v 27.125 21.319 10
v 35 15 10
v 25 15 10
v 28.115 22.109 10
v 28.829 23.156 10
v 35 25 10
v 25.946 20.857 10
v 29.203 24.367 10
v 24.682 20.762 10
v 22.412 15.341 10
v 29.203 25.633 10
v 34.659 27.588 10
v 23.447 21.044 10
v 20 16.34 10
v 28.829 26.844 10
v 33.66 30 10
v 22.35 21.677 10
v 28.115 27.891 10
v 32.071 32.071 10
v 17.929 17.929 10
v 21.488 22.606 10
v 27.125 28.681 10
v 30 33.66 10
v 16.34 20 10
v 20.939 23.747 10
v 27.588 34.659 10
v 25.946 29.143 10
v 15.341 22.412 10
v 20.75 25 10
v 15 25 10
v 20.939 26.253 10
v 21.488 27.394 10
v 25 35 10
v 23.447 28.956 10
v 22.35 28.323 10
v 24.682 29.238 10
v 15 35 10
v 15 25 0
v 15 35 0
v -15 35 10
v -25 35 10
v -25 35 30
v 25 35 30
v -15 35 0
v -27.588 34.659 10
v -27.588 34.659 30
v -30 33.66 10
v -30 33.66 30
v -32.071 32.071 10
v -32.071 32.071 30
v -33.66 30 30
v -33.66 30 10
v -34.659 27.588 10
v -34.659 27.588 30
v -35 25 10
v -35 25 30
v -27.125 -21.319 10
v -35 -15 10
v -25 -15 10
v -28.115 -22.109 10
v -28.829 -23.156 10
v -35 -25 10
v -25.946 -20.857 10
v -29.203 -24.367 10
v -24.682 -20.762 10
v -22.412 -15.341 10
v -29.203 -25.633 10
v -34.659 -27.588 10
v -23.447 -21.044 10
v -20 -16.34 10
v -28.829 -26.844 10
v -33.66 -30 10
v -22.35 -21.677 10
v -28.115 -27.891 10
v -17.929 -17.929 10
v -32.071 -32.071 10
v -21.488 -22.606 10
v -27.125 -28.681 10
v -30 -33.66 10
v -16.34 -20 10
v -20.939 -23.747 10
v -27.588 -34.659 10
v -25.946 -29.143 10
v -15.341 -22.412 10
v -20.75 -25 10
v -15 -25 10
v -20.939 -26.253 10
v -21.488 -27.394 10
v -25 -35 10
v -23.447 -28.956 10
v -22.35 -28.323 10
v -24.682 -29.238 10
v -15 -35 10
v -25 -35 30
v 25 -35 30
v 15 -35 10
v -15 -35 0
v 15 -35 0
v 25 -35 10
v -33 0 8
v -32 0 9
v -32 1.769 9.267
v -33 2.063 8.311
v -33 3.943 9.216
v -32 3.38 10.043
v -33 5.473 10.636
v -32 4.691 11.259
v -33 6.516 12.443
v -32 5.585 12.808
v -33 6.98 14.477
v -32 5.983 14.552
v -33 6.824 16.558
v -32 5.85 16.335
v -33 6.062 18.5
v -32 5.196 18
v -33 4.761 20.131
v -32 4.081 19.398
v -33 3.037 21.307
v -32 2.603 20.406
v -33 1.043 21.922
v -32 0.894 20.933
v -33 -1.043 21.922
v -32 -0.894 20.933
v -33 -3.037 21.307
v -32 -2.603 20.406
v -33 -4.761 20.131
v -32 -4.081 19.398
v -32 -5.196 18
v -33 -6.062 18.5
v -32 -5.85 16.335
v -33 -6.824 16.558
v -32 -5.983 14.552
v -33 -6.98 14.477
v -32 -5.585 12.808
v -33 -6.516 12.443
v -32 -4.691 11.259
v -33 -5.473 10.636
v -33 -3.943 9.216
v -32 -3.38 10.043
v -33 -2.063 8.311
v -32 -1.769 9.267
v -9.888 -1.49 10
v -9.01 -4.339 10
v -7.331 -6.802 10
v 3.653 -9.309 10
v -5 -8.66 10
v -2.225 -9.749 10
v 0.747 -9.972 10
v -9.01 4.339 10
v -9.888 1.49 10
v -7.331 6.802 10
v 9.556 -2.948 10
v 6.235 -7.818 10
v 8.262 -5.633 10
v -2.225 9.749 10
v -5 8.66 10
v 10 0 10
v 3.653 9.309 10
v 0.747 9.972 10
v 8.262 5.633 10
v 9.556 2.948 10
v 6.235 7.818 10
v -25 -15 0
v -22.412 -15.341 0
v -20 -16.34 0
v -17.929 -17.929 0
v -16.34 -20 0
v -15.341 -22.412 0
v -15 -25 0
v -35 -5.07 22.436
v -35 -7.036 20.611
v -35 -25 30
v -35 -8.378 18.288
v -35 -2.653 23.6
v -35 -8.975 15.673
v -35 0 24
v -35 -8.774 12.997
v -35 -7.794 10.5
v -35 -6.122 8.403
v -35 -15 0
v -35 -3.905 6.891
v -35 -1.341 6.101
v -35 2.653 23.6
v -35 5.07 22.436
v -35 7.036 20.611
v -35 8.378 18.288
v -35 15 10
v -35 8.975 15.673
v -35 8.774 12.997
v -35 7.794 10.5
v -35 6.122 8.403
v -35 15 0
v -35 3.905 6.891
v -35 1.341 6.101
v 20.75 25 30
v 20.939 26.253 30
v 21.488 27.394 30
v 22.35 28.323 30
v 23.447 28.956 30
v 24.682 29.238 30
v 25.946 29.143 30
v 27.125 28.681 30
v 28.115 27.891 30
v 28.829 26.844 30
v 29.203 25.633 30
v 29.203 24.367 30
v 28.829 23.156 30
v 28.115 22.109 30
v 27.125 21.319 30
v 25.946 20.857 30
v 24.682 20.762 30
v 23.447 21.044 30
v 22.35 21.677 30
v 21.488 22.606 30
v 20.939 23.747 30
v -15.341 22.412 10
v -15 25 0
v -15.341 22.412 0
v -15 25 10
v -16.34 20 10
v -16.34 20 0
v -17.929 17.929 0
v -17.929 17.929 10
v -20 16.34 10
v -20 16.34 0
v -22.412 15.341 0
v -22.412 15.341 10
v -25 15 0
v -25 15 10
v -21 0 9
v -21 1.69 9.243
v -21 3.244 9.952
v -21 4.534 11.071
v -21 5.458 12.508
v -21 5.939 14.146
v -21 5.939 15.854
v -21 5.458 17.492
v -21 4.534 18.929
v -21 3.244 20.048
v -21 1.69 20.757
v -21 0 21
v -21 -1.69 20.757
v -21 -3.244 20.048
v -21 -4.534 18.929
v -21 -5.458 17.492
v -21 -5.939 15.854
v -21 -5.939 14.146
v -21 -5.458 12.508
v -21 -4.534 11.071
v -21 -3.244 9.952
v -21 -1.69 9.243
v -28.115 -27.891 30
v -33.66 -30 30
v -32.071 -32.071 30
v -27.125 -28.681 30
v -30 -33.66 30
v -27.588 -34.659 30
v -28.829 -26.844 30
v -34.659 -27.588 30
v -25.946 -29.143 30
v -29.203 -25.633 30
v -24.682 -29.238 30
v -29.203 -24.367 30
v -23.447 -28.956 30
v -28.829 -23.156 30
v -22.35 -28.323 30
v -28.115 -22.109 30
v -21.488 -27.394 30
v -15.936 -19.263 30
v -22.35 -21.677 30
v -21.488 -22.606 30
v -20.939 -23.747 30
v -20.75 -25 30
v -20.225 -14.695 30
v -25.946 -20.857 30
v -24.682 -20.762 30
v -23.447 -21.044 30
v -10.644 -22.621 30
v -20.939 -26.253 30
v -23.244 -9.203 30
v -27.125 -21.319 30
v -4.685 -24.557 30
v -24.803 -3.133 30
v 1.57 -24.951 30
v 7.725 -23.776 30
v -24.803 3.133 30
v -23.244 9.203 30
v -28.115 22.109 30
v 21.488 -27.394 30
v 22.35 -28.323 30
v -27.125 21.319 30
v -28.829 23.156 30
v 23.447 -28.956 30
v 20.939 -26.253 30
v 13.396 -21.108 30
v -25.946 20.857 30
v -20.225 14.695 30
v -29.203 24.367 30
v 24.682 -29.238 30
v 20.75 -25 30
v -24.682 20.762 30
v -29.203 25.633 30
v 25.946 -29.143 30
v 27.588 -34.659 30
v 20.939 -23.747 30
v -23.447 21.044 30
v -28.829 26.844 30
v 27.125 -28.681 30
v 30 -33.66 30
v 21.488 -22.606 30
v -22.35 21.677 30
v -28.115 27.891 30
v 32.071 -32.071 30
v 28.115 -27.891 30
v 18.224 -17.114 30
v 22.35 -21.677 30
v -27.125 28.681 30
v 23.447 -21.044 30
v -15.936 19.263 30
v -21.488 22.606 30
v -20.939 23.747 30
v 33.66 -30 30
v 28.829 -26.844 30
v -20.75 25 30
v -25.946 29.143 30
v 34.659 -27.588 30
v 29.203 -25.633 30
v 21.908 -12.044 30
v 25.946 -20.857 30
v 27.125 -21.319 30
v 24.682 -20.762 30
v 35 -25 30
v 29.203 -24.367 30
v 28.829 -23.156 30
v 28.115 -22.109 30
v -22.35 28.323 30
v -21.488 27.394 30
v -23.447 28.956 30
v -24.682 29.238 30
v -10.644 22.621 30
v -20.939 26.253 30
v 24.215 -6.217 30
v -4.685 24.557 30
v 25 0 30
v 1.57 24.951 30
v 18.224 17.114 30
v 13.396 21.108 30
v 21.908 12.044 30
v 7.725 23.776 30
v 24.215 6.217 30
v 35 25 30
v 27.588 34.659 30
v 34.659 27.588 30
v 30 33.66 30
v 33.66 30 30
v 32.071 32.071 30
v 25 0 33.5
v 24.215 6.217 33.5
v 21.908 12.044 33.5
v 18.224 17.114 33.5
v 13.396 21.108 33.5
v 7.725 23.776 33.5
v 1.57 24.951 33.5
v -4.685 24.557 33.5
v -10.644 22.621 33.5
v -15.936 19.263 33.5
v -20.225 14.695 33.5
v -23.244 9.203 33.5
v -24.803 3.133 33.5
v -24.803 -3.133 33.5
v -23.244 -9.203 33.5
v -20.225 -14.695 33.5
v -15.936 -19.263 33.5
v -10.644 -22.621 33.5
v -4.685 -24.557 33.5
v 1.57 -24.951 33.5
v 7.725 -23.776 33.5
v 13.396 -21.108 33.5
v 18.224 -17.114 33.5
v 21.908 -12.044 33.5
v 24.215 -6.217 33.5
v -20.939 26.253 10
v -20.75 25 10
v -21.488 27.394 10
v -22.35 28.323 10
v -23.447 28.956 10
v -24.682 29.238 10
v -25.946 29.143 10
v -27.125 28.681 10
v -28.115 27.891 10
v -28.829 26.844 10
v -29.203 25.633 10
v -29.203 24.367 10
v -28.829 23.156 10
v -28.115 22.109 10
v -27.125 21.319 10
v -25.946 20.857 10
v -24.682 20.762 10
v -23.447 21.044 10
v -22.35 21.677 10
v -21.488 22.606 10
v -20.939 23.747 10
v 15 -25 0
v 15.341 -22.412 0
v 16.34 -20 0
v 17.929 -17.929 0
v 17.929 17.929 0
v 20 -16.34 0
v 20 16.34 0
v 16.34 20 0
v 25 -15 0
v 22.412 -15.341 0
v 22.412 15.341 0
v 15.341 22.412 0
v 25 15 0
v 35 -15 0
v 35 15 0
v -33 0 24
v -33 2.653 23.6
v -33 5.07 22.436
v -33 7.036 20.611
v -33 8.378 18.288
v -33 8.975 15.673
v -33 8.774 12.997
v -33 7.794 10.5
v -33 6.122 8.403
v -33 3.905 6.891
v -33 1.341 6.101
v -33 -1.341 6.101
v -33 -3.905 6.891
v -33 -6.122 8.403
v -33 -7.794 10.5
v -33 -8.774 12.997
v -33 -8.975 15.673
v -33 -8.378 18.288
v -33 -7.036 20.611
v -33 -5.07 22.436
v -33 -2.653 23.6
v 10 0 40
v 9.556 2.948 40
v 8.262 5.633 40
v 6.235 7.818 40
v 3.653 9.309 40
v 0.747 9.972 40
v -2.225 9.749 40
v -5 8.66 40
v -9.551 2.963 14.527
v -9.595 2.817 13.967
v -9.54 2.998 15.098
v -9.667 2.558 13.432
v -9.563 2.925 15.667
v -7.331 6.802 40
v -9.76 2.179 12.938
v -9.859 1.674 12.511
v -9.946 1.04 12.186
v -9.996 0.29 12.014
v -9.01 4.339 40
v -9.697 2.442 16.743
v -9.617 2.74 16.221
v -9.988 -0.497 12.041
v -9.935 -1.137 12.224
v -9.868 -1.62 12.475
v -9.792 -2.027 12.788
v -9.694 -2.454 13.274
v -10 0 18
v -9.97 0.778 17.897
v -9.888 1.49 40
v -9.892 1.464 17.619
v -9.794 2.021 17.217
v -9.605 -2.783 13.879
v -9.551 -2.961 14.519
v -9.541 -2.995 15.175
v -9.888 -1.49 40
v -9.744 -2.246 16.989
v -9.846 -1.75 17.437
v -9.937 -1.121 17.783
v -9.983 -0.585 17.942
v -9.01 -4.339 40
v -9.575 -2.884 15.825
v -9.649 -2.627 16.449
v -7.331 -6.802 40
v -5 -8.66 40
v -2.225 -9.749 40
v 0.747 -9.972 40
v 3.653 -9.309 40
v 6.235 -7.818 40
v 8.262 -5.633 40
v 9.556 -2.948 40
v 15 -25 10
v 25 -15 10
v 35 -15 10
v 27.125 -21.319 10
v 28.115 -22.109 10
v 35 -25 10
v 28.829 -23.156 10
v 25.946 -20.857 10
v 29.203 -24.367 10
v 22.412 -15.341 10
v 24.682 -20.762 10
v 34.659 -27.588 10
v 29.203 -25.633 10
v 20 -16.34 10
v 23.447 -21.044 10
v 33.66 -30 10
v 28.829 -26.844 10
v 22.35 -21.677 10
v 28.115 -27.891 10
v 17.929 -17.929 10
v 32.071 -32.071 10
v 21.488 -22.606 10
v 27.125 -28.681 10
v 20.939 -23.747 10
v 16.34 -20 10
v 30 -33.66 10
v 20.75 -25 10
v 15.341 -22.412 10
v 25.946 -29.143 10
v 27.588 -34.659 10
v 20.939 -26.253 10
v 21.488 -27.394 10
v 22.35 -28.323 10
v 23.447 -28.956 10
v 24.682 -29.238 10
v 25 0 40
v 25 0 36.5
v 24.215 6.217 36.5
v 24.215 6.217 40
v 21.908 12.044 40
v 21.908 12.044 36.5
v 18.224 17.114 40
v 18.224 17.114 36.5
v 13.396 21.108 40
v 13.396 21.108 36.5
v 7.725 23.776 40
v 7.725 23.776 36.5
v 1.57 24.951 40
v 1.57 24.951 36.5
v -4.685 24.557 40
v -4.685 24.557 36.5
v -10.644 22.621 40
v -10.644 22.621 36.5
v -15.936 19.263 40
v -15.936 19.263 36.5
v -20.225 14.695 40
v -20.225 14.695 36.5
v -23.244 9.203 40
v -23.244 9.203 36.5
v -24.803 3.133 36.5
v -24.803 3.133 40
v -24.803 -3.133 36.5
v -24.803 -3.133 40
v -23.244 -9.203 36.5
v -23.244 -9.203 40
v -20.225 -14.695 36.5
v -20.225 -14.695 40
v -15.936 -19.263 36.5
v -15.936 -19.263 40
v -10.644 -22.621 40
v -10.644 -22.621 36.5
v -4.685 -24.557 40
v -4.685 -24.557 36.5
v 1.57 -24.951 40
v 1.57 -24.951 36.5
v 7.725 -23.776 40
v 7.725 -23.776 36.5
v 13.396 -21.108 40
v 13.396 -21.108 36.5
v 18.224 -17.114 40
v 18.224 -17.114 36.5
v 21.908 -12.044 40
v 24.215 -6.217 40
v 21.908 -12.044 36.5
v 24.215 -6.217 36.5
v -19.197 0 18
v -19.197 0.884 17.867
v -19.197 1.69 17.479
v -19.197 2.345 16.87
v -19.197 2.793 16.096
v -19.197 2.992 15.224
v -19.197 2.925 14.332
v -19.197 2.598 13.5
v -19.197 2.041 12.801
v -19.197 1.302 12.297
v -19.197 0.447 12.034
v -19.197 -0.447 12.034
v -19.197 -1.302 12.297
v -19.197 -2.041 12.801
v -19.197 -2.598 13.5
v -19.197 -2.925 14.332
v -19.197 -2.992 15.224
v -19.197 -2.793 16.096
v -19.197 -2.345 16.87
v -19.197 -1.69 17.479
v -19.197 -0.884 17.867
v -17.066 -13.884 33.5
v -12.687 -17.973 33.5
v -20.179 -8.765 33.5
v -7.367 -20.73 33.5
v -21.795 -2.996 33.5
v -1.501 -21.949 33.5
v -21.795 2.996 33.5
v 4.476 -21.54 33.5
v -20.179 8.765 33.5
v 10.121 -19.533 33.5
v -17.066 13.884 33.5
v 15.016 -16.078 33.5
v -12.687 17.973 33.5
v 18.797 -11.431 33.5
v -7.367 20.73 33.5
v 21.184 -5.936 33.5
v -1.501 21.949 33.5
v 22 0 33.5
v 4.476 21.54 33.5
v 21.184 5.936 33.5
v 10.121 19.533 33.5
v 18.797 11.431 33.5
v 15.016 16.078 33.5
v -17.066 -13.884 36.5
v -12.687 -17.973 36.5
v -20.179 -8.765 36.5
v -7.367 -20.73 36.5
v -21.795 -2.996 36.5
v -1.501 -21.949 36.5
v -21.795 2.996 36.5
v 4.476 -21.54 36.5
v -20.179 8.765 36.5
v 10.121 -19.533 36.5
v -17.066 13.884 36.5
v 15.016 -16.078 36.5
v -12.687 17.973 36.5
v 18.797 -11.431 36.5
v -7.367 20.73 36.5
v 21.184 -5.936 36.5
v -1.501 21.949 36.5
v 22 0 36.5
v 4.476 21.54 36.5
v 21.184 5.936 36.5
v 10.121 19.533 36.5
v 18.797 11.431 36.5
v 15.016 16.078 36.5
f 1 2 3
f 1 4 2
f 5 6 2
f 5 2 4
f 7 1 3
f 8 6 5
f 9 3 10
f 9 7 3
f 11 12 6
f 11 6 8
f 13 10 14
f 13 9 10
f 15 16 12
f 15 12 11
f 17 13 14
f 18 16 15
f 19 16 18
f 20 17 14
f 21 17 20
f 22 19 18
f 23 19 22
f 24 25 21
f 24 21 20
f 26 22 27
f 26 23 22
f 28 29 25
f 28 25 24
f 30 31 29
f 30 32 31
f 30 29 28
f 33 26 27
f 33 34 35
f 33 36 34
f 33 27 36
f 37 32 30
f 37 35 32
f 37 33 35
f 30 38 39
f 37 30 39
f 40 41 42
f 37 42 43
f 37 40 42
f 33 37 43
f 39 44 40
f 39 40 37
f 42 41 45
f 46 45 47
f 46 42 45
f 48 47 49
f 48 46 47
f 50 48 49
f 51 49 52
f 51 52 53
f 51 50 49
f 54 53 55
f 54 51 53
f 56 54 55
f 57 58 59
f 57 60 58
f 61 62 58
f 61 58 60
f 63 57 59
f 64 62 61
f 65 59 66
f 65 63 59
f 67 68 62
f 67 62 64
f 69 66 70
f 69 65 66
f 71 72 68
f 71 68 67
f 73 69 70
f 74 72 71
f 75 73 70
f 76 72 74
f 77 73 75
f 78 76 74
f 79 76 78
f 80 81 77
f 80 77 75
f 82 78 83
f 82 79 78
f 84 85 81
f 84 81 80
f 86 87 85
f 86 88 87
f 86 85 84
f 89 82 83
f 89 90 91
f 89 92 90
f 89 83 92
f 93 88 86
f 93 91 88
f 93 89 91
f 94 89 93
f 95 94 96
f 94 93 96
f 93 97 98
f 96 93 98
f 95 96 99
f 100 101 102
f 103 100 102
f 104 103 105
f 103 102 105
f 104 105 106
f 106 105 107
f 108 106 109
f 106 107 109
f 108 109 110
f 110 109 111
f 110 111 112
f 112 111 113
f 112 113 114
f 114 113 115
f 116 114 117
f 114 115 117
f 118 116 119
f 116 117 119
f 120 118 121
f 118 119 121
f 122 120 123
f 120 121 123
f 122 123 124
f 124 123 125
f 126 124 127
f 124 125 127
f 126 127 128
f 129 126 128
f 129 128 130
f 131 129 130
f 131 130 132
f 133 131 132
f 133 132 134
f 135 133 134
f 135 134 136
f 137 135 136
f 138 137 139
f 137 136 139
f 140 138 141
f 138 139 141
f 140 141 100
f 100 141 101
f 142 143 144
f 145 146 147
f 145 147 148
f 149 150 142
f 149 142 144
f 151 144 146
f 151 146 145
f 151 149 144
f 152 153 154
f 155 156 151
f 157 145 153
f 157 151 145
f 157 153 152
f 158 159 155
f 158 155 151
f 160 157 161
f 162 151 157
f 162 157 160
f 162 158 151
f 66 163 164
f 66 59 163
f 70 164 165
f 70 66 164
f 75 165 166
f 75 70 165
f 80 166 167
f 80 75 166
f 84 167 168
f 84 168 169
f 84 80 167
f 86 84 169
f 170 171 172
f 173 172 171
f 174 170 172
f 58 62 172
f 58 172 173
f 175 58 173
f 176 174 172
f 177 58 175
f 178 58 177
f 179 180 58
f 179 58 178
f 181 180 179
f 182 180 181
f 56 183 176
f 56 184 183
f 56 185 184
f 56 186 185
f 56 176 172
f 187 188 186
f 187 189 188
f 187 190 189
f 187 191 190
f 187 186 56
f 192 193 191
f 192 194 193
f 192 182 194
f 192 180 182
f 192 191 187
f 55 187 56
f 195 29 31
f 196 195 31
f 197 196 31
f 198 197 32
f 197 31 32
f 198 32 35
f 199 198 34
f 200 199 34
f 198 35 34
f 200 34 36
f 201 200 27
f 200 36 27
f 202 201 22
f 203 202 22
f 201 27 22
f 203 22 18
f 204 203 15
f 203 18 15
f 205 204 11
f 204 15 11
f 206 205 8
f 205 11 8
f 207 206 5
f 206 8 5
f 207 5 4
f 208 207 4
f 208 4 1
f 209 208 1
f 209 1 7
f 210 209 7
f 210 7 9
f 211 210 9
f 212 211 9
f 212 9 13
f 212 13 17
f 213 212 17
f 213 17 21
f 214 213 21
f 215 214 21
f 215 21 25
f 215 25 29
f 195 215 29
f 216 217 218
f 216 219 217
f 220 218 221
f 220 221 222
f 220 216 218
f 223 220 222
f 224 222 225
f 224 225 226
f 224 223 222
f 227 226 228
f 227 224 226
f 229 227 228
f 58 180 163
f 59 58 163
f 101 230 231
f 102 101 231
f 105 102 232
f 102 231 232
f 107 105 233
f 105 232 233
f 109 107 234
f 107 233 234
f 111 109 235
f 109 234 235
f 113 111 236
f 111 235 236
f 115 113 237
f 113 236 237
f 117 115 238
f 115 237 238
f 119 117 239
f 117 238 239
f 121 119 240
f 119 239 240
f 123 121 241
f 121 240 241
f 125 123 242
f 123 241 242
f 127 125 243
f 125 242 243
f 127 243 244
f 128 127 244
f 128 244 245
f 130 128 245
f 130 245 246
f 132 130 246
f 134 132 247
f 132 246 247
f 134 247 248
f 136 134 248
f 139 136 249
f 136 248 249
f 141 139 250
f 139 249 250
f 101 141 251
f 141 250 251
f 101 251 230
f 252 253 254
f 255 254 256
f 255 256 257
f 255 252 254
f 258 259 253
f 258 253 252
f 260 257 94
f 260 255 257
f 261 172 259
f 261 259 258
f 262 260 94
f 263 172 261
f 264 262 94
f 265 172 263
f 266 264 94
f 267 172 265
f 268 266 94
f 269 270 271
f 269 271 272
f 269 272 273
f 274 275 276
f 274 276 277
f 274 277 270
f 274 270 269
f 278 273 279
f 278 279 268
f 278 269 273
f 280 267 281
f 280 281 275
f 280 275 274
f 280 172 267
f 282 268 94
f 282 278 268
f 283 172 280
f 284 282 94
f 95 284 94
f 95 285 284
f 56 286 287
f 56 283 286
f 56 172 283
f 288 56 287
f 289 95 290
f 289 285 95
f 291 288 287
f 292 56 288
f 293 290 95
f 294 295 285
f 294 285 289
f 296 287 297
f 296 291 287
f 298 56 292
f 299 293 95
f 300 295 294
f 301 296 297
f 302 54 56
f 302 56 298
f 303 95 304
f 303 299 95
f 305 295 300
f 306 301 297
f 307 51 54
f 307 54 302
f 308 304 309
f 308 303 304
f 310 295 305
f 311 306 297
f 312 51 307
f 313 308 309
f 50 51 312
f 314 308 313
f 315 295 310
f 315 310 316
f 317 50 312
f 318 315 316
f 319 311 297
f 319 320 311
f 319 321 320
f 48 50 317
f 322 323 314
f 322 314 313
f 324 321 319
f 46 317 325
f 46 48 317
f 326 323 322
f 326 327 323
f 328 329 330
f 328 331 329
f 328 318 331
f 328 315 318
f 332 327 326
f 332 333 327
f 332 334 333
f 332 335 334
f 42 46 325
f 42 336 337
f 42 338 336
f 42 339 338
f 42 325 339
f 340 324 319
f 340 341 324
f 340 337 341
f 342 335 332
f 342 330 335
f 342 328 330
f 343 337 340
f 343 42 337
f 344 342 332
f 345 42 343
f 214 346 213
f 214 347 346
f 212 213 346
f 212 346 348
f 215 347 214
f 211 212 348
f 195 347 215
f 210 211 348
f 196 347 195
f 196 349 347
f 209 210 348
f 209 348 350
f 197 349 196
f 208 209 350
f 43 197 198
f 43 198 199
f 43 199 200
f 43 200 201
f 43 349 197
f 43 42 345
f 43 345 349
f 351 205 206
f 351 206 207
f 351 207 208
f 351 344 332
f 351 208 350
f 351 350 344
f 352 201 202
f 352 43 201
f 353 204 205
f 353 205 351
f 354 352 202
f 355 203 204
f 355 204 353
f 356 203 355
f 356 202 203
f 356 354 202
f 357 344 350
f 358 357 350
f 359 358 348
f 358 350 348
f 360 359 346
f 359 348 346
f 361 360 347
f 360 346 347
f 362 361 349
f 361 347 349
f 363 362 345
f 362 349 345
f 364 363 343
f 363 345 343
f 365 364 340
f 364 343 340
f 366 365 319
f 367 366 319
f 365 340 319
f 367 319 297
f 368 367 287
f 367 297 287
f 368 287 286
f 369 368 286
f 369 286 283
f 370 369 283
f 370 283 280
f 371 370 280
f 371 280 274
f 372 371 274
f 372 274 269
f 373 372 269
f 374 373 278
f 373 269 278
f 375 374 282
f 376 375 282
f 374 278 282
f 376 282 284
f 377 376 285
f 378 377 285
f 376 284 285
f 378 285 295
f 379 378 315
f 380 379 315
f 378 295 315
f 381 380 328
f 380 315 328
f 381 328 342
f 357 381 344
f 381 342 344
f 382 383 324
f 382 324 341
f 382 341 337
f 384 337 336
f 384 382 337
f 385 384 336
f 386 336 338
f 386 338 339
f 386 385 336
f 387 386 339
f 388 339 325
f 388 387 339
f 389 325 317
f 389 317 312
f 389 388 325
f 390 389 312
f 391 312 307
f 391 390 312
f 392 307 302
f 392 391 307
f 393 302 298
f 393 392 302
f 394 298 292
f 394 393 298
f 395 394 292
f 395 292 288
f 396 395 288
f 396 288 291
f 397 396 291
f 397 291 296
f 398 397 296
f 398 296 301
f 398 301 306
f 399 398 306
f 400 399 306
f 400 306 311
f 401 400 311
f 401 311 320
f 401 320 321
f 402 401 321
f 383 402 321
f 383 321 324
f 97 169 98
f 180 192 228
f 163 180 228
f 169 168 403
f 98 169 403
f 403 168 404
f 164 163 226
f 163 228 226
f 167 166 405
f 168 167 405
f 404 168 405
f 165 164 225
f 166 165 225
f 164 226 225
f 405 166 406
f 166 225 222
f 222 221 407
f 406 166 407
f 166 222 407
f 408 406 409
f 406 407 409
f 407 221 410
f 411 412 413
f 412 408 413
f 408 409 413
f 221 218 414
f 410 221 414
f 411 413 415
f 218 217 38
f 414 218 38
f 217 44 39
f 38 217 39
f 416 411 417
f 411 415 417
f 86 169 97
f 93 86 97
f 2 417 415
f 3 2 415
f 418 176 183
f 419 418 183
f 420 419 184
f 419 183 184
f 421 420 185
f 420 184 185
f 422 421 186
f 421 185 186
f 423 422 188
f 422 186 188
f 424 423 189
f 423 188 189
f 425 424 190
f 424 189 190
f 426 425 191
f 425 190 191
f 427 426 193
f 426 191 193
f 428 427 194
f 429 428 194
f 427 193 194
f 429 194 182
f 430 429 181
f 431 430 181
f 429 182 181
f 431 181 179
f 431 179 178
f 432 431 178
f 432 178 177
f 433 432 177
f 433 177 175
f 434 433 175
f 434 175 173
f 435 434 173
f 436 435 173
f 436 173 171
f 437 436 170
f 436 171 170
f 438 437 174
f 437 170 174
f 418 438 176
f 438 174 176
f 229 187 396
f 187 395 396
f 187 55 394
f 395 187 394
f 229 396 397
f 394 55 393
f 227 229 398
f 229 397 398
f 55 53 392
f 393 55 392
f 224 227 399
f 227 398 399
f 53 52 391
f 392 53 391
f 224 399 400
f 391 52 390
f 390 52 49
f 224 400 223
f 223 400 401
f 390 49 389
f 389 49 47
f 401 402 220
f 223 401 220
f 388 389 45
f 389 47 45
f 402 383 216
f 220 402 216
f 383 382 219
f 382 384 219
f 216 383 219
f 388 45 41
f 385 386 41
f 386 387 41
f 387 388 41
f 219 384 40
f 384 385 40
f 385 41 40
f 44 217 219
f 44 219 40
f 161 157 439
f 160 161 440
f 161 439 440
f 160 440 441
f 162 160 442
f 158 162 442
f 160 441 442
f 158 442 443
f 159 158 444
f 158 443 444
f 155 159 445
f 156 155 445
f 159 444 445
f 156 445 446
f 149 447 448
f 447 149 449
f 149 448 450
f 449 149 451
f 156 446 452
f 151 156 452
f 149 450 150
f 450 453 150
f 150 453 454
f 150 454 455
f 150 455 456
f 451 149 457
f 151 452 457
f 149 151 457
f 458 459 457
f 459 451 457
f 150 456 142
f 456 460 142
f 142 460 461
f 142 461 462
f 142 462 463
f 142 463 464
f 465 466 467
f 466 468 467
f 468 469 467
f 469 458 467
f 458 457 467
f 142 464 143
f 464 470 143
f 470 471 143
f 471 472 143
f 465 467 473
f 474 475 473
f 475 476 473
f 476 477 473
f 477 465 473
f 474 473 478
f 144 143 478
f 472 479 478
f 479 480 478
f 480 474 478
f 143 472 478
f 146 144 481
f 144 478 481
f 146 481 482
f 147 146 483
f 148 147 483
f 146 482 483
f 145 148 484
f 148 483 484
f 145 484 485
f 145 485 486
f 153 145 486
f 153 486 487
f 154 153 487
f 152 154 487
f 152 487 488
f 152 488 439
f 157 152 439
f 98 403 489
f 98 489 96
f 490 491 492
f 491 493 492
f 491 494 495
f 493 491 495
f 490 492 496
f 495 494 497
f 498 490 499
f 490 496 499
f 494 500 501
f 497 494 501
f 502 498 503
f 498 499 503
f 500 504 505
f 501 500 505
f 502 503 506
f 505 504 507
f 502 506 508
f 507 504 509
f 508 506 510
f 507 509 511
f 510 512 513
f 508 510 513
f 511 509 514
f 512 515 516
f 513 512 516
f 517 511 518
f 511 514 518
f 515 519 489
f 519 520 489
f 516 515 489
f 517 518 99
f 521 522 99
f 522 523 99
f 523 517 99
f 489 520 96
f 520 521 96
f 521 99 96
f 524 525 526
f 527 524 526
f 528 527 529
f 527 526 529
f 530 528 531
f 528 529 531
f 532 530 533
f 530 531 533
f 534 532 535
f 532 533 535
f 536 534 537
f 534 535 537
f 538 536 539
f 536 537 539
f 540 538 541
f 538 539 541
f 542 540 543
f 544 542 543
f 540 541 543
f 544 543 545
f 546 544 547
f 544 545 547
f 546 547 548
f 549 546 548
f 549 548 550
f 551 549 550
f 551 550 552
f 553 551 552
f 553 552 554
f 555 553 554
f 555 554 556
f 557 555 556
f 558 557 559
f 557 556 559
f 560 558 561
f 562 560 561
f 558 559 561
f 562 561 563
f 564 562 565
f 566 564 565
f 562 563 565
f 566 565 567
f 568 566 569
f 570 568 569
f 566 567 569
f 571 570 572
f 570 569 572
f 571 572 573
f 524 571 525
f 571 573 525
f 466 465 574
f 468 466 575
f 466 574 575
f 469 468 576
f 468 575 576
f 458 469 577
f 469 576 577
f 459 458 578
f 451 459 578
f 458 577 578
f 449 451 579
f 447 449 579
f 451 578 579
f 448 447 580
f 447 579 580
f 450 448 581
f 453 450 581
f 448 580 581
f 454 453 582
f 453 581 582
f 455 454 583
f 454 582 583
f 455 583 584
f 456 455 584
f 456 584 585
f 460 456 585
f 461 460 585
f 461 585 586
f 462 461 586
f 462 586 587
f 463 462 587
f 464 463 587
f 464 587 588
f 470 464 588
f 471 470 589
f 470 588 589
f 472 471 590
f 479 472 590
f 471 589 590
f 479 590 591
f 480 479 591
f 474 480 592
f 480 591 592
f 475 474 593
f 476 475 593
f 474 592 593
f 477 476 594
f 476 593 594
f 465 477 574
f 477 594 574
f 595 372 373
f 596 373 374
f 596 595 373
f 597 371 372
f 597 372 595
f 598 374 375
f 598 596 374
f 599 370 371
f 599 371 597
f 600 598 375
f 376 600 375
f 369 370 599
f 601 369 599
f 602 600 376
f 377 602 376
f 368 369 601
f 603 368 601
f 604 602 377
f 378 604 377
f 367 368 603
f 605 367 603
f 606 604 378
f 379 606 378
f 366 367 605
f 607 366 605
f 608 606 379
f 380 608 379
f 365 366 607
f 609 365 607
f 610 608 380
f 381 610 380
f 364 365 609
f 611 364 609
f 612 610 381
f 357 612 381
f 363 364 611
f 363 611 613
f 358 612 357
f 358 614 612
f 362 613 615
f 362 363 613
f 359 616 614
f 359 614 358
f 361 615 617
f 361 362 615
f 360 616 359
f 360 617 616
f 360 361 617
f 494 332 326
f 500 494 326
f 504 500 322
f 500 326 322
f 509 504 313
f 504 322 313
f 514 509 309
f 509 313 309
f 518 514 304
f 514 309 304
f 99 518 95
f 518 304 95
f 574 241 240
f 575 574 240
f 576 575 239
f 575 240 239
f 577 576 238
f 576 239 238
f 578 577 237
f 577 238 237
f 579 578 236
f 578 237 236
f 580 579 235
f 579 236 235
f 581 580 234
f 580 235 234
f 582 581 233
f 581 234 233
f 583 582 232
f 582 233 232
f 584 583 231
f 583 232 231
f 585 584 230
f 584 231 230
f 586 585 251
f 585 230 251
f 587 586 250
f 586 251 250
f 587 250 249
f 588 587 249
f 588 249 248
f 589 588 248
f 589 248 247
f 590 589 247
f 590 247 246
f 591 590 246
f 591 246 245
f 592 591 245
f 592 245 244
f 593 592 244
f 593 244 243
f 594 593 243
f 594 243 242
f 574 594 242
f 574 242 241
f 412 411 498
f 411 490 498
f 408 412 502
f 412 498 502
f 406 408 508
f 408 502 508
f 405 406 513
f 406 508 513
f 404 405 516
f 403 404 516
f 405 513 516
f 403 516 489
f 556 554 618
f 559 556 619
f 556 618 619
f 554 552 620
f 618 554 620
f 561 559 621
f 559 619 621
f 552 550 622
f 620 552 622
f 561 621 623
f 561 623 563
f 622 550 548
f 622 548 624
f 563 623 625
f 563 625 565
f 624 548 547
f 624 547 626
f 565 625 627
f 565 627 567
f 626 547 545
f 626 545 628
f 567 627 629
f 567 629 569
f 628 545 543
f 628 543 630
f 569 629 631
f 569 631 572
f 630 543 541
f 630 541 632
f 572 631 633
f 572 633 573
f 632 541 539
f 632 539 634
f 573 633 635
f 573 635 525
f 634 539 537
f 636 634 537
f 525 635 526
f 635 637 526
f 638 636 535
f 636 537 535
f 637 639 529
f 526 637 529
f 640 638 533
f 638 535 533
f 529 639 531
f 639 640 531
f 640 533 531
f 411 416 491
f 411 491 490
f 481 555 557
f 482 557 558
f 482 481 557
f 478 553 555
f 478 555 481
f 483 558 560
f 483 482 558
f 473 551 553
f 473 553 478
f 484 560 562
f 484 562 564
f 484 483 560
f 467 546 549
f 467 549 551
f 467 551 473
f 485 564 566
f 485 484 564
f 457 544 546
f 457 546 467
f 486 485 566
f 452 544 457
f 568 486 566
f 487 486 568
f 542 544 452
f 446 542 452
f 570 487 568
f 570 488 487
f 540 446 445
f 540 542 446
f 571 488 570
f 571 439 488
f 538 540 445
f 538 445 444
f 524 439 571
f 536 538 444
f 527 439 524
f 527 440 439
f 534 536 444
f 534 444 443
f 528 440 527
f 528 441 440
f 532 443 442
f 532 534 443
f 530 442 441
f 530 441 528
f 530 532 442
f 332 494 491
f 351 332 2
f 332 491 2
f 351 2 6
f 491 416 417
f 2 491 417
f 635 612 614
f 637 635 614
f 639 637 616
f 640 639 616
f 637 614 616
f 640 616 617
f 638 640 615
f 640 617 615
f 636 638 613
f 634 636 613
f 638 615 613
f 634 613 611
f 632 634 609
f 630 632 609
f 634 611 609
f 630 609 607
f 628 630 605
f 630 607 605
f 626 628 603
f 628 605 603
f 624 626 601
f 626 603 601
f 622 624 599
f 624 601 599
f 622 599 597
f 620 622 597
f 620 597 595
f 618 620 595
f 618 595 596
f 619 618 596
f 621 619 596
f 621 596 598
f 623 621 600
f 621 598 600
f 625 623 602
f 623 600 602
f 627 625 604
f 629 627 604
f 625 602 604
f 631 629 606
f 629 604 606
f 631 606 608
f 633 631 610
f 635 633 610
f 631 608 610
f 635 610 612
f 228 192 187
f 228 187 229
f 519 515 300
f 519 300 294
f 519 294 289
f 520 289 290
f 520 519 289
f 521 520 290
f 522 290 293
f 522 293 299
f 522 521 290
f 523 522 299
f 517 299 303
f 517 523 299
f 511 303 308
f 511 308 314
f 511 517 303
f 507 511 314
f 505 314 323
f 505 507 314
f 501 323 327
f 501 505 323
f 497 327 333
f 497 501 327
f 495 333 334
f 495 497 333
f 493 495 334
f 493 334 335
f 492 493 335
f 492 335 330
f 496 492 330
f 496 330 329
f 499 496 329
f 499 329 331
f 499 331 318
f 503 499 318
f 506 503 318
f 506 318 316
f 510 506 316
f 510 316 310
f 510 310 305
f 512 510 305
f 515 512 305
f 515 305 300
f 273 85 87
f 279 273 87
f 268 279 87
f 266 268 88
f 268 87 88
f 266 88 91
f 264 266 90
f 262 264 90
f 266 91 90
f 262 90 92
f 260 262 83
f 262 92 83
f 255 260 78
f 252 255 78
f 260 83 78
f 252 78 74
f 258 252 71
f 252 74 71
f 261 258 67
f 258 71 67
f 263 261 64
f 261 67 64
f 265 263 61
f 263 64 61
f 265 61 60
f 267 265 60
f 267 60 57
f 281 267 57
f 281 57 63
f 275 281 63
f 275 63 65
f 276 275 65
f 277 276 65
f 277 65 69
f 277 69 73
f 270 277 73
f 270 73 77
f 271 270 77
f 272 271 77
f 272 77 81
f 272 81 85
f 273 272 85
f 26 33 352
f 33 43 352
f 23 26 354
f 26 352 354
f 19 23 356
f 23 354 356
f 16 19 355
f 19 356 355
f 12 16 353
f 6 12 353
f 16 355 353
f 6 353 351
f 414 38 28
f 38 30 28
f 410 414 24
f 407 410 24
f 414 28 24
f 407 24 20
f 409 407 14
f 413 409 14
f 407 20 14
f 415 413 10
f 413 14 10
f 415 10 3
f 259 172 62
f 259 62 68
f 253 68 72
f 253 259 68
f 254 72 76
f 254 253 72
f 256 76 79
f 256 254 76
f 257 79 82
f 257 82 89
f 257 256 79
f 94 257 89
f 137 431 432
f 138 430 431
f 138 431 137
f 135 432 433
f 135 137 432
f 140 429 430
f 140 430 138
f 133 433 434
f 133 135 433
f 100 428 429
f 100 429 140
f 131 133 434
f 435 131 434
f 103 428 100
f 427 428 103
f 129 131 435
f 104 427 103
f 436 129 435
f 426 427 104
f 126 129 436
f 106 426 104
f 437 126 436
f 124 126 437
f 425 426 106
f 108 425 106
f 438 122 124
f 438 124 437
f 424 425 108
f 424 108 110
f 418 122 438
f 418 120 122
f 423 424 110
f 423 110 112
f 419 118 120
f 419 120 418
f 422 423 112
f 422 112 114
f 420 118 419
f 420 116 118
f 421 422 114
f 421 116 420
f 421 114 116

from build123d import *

# Parameters (mm, degrees)
SKETCH1_W               = 70
SKETCH1_H               = 70
BOSS_EXTRUDE1_DEPTH     = 30
SKETCH2_R               = 25
BOSS_EXTRUDE2_DEPTH     = 3.5
SKETCH3_R               = 22
BOSS_EXTRUDE3_DEPTH     = 3
SKETCH4_R               = 25
BOSS_EXTRUDE4_DEPTH     = 3.5
CUT_EXTRUDE1_REACH      = 65.64
SKETCH5_R               = 4.25
SKETCH5_3_W             = 20
SKETCH5_3_H             = 20
SKETCH5_3_R             = 4.25
CUT_EXTRUDE2_DEPTH      = 10
FILLET1_R               = 10
FILLET2_R               = 10
SKETCH7_R               = 10
CUT_EXTRUDE3_DEPTH      = 30
SKETCH8_R               = 9
CUT_EXTRUDE4_DEPTH      = 2
MIRROR6_COPY_1_REACH    = 65.64
MIRROR6_COPY_1_SKETCH_R = 4.25
MIRROR6_COPY_2_SKETCH_W = 20
MIRROR6_COPY_2_SKETCH_H = 20
MIRROR6_COPY_2_SKETCH_R = 4.25
MIRROR6_COPY_2_DEPTH    = 10
FILLET3_R               = 10
M14_TAPPED_HOLE1_D      = 12
M14_TAPPED_HOLE1_DEPTH  = 12
M14_TAPPED_HOLE1_TIP    = 3.605163714
CHAMFER1_SIZE           = 1
CUT_EXTRUDE5_REACH      = 88.308
CUT_EXTRUDE5_END_RADIUS = 10
SKETCH13_R              = 3


with BuildPart() as part:
    # Sketch1 → Boss-Extrude1 (new body)
    with BuildSketch(Plane.XY):
        Rectangle(SKETCH1_W, SKETCH1_H)
    extrude(amount=BOSS_EXTRUDE1_DEPTH)

    # Sketch2 → Boss-Extrude2 (add)
    with BuildSketch(Plane.XY.offset(30)):
        Circle(SKETCH2_R)
    extrude(amount=BOSS_EXTRUDE2_DEPTH)

    # Sketch3 → Boss-Extrude3 (add)
    with BuildSketch(Plane.XY.offset(33.5)):
        Circle(SKETCH3_R)
    extrude(amount=BOSS_EXTRUDE3_DEPTH)

    # Sketch4 → Boss-Extrude4 (add)
    with BuildSketch(Plane.XY.offset(36.5)):
        Circle(SKETCH4_R)
    extrude(amount=BOSS_EXTRUDE4_DEPTH)

    # Sketch5 → Cut-Extrude1 (cut, up to next)
    with BuildSketch(Plane(origin=(0, 0, 0), x_dir=(-1, 0, 0), z_dir=(0, 0, -1)), mode=Mode.PRIVATE) as cut_extrude1_sk1:
        with Locations((-25, 25)):
            Circle(SKETCH5_R)
    cut_extrude1_tool1 = extrude(cut_extrude1_sk1.sketch, amount=-CUT_EXTRUDE1_REACH, mode=Mode.PRIVATE) & part.part
    cut_extrude1 = cut_extrude1_tool1.solids().sort_by_distance((25, 25, 0))[0]
    add(cut_extrude1, mode=Mode.SUBTRACT)

    # Sketch5<3> → Cut-Extrude2 (cut)
    with BuildSketch(Plane(origin=(0, 0, 0), x_dir=(-1, 0, 0), z_dir=(0, 0, -1))):
        with Locations((-25, 25)):
            Rectangle(SKETCH5_3_W, SKETCH5_3_H)
        with Locations((-25, 25)):
            Circle(SKETCH5_3_R, mode=Mode.SUBTRACT)
    cut_extrude2 = extrude(amount=-CUT_EXTRUDE2_DEPTH, mode=Mode.SUBTRACT)

    # Fillet1
    fillet1_edges = [part.edges().sort_by_distance(p)[0] for p in [
        (15, 15, 5),
        (35, 35, 20),
    ]]
    fillet(fillet1_edges, radius=FILLET1_R)

    # Fillet2
    fillet2_edges = [part.edges().sort_by_distance(p)[0] for p in [
        (-35, 35, 15),
        (35, -35, 15),
        (-35, -35, 15),
    ]]
    fillet(fillet2_edges, radius=FILLET2_R)

    # Sketch7 → Cut-Extrude3 (cut)
    with BuildSketch(Plane.XY.offset(40)):
        Circle(SKETCH7_R)
    extrude(amount=-CUT_EXTRUDE3_DEPTH, mode=Mode.SUBTRACT)

    # Sketch8 → Cut-Extrude4 (cut)
    with BuildSketch(Plane.ZY.offset(35)):
        with Locations((15, 0)):
            Circle(SKETCH8_R)
    extrude(amount=-CUT_EXTRUDE4_DEPTH, mode=Mode.SUBTRACT)

    # Mirror5: Cut-Extrude1, Cut-Extrude2 across plane
    add(cut_extrude1.mirror(Plane.ZX), mode=Mode.SUBTRACT)
    add(cut_extrude2.mirror(Plane.ZX), mode=Mode.SUBTRACT)

    # Mirror6: Cut-Extrude1, Cut-Extrude2 across plane
    add(cut_extrude1.mirror(Plane(origin=(0, 0, 0), x_dir=(0, 0, 1), z_dir=(1, 0, 0))), mode=Mode.SUBTRACT)
    add(cut_extrude2.mirror(Plane(origin=(0, 0, 0), x_dir=(0, 0, 1), z_dir=(1, 0, 0))), mode=Mode.SUBTRACT)

    # Mirror6 copy 1 sketch → Mirror6 copy 1 (cut, up to next)
    with BuildSketch(Plane(origin=(0, 0, 0), x_dir=(1, 0, 0), z_dir=(0, 0, -1)), mode=Mode.PRIVATE) as mirror6_copy_1_sk1:
        with Locations((-25, 25)):
            Circle(MIRROR6_COPY_1_SKETCH_R)
    mirror6_copy_1_tool1 = extrude(mirror6_copy_1_sk1.sketch, amount=-MIRROR6_COPY_1_REACH, mode=Mode.PRIVATE) & part.part
    add(mirror6_copy_1_tool1.solids().sort_by_distance((-25, -25, 0))[0], mode=Mode.SUBTRACT)

    # Mirror6 copy 2 sketch → Mirror6 copy 2 (cut)
    with BuildSketch(Plane(origin=(0, 0, 0), x_dir=(1, 0, 0), z_dir=(0, 0, -1))):
        with Locations((-25, 25)):
            Rectangle(MIRROR6_COPY_2_SKETCH_W, MIRROR6_COPY_2_SKETCH_H)
        with Locations((-25, 25)):
            Circle(MIRROR6_COPY_2_SKETCH_R, mode=Mode.SUBTRACT)
    extrude(amount=-MIRROR6_COPY_2_DEPTH, mode=Mode.SUBTRACT)

    # Fillet3
    fillet3_edges = [part.edges().sort_by_distance(p)[0] for p in [
        (-15, 15, 5),
        (-15, -15, 5),
        (15, -15, 5),
    ]]
    fillet(fillet3_edges, radius=FILLET3_R)

    # M14 Tapped Hole1
    with Locations(Plane.ZY.offset(33)):
        with Locations((15, 0)):
            Hole(M14_TAPPED_HOLE1_D / 2, depth=M14_TAPPED_HOLE1_DEPTH)
            with Locations((0, 0, -(M14_TAPPED_HOLE1_DEPTH + M14_TAPPED_HOLE1_TIP / 2))):  # 118° drill point
                Cone(0, M14_TAPPED_HOLE1_D / 2, M14_TAPPED_HOLE1_TIP, mode=Mode.SUBTRACT)

    # Chamfer1
    chamfer1_edges = [part.edges().sort_by_distance(p)[0] for p in [
        (-33, 0, 21),
    ]]
    chamfer(chamfer1_edges, length=CHAMFER1_SIZE)

    # Cut-Extrude5: up to this cylinder (the profile starts outside it)
    cut_extrude5_end = Plane(origin=(0, 0, 15), z_dir=(0, 0, 1)) * Cylinder(CUT_EXTRUDE5_END_RADIUS, 197.616, mode=Mode.PRIVATE)
    # Sketch13 → Cut-Extrude5 (cut, up to the surface)
    with BuildSketch(Plane.ZY.offset(33), mode=Mode.PRIVATE) as cut_extrude5_sk1:
        with Locations((15, 0)):
            Circle(SKETCH13_R)
    cut_extrude5_tool1 = extrude(cut_extrude5_sk1.sketch, amount=-CUT_EXTRUDE5_REACH, mode=Mode.PRIVATE) - cut_extrude5_end
    add(cut_extrude5_tool1.solids().sort_by_distance((-33, 0, 15))[0], mode=Mode.SUBTRACT)


solid = part.part
